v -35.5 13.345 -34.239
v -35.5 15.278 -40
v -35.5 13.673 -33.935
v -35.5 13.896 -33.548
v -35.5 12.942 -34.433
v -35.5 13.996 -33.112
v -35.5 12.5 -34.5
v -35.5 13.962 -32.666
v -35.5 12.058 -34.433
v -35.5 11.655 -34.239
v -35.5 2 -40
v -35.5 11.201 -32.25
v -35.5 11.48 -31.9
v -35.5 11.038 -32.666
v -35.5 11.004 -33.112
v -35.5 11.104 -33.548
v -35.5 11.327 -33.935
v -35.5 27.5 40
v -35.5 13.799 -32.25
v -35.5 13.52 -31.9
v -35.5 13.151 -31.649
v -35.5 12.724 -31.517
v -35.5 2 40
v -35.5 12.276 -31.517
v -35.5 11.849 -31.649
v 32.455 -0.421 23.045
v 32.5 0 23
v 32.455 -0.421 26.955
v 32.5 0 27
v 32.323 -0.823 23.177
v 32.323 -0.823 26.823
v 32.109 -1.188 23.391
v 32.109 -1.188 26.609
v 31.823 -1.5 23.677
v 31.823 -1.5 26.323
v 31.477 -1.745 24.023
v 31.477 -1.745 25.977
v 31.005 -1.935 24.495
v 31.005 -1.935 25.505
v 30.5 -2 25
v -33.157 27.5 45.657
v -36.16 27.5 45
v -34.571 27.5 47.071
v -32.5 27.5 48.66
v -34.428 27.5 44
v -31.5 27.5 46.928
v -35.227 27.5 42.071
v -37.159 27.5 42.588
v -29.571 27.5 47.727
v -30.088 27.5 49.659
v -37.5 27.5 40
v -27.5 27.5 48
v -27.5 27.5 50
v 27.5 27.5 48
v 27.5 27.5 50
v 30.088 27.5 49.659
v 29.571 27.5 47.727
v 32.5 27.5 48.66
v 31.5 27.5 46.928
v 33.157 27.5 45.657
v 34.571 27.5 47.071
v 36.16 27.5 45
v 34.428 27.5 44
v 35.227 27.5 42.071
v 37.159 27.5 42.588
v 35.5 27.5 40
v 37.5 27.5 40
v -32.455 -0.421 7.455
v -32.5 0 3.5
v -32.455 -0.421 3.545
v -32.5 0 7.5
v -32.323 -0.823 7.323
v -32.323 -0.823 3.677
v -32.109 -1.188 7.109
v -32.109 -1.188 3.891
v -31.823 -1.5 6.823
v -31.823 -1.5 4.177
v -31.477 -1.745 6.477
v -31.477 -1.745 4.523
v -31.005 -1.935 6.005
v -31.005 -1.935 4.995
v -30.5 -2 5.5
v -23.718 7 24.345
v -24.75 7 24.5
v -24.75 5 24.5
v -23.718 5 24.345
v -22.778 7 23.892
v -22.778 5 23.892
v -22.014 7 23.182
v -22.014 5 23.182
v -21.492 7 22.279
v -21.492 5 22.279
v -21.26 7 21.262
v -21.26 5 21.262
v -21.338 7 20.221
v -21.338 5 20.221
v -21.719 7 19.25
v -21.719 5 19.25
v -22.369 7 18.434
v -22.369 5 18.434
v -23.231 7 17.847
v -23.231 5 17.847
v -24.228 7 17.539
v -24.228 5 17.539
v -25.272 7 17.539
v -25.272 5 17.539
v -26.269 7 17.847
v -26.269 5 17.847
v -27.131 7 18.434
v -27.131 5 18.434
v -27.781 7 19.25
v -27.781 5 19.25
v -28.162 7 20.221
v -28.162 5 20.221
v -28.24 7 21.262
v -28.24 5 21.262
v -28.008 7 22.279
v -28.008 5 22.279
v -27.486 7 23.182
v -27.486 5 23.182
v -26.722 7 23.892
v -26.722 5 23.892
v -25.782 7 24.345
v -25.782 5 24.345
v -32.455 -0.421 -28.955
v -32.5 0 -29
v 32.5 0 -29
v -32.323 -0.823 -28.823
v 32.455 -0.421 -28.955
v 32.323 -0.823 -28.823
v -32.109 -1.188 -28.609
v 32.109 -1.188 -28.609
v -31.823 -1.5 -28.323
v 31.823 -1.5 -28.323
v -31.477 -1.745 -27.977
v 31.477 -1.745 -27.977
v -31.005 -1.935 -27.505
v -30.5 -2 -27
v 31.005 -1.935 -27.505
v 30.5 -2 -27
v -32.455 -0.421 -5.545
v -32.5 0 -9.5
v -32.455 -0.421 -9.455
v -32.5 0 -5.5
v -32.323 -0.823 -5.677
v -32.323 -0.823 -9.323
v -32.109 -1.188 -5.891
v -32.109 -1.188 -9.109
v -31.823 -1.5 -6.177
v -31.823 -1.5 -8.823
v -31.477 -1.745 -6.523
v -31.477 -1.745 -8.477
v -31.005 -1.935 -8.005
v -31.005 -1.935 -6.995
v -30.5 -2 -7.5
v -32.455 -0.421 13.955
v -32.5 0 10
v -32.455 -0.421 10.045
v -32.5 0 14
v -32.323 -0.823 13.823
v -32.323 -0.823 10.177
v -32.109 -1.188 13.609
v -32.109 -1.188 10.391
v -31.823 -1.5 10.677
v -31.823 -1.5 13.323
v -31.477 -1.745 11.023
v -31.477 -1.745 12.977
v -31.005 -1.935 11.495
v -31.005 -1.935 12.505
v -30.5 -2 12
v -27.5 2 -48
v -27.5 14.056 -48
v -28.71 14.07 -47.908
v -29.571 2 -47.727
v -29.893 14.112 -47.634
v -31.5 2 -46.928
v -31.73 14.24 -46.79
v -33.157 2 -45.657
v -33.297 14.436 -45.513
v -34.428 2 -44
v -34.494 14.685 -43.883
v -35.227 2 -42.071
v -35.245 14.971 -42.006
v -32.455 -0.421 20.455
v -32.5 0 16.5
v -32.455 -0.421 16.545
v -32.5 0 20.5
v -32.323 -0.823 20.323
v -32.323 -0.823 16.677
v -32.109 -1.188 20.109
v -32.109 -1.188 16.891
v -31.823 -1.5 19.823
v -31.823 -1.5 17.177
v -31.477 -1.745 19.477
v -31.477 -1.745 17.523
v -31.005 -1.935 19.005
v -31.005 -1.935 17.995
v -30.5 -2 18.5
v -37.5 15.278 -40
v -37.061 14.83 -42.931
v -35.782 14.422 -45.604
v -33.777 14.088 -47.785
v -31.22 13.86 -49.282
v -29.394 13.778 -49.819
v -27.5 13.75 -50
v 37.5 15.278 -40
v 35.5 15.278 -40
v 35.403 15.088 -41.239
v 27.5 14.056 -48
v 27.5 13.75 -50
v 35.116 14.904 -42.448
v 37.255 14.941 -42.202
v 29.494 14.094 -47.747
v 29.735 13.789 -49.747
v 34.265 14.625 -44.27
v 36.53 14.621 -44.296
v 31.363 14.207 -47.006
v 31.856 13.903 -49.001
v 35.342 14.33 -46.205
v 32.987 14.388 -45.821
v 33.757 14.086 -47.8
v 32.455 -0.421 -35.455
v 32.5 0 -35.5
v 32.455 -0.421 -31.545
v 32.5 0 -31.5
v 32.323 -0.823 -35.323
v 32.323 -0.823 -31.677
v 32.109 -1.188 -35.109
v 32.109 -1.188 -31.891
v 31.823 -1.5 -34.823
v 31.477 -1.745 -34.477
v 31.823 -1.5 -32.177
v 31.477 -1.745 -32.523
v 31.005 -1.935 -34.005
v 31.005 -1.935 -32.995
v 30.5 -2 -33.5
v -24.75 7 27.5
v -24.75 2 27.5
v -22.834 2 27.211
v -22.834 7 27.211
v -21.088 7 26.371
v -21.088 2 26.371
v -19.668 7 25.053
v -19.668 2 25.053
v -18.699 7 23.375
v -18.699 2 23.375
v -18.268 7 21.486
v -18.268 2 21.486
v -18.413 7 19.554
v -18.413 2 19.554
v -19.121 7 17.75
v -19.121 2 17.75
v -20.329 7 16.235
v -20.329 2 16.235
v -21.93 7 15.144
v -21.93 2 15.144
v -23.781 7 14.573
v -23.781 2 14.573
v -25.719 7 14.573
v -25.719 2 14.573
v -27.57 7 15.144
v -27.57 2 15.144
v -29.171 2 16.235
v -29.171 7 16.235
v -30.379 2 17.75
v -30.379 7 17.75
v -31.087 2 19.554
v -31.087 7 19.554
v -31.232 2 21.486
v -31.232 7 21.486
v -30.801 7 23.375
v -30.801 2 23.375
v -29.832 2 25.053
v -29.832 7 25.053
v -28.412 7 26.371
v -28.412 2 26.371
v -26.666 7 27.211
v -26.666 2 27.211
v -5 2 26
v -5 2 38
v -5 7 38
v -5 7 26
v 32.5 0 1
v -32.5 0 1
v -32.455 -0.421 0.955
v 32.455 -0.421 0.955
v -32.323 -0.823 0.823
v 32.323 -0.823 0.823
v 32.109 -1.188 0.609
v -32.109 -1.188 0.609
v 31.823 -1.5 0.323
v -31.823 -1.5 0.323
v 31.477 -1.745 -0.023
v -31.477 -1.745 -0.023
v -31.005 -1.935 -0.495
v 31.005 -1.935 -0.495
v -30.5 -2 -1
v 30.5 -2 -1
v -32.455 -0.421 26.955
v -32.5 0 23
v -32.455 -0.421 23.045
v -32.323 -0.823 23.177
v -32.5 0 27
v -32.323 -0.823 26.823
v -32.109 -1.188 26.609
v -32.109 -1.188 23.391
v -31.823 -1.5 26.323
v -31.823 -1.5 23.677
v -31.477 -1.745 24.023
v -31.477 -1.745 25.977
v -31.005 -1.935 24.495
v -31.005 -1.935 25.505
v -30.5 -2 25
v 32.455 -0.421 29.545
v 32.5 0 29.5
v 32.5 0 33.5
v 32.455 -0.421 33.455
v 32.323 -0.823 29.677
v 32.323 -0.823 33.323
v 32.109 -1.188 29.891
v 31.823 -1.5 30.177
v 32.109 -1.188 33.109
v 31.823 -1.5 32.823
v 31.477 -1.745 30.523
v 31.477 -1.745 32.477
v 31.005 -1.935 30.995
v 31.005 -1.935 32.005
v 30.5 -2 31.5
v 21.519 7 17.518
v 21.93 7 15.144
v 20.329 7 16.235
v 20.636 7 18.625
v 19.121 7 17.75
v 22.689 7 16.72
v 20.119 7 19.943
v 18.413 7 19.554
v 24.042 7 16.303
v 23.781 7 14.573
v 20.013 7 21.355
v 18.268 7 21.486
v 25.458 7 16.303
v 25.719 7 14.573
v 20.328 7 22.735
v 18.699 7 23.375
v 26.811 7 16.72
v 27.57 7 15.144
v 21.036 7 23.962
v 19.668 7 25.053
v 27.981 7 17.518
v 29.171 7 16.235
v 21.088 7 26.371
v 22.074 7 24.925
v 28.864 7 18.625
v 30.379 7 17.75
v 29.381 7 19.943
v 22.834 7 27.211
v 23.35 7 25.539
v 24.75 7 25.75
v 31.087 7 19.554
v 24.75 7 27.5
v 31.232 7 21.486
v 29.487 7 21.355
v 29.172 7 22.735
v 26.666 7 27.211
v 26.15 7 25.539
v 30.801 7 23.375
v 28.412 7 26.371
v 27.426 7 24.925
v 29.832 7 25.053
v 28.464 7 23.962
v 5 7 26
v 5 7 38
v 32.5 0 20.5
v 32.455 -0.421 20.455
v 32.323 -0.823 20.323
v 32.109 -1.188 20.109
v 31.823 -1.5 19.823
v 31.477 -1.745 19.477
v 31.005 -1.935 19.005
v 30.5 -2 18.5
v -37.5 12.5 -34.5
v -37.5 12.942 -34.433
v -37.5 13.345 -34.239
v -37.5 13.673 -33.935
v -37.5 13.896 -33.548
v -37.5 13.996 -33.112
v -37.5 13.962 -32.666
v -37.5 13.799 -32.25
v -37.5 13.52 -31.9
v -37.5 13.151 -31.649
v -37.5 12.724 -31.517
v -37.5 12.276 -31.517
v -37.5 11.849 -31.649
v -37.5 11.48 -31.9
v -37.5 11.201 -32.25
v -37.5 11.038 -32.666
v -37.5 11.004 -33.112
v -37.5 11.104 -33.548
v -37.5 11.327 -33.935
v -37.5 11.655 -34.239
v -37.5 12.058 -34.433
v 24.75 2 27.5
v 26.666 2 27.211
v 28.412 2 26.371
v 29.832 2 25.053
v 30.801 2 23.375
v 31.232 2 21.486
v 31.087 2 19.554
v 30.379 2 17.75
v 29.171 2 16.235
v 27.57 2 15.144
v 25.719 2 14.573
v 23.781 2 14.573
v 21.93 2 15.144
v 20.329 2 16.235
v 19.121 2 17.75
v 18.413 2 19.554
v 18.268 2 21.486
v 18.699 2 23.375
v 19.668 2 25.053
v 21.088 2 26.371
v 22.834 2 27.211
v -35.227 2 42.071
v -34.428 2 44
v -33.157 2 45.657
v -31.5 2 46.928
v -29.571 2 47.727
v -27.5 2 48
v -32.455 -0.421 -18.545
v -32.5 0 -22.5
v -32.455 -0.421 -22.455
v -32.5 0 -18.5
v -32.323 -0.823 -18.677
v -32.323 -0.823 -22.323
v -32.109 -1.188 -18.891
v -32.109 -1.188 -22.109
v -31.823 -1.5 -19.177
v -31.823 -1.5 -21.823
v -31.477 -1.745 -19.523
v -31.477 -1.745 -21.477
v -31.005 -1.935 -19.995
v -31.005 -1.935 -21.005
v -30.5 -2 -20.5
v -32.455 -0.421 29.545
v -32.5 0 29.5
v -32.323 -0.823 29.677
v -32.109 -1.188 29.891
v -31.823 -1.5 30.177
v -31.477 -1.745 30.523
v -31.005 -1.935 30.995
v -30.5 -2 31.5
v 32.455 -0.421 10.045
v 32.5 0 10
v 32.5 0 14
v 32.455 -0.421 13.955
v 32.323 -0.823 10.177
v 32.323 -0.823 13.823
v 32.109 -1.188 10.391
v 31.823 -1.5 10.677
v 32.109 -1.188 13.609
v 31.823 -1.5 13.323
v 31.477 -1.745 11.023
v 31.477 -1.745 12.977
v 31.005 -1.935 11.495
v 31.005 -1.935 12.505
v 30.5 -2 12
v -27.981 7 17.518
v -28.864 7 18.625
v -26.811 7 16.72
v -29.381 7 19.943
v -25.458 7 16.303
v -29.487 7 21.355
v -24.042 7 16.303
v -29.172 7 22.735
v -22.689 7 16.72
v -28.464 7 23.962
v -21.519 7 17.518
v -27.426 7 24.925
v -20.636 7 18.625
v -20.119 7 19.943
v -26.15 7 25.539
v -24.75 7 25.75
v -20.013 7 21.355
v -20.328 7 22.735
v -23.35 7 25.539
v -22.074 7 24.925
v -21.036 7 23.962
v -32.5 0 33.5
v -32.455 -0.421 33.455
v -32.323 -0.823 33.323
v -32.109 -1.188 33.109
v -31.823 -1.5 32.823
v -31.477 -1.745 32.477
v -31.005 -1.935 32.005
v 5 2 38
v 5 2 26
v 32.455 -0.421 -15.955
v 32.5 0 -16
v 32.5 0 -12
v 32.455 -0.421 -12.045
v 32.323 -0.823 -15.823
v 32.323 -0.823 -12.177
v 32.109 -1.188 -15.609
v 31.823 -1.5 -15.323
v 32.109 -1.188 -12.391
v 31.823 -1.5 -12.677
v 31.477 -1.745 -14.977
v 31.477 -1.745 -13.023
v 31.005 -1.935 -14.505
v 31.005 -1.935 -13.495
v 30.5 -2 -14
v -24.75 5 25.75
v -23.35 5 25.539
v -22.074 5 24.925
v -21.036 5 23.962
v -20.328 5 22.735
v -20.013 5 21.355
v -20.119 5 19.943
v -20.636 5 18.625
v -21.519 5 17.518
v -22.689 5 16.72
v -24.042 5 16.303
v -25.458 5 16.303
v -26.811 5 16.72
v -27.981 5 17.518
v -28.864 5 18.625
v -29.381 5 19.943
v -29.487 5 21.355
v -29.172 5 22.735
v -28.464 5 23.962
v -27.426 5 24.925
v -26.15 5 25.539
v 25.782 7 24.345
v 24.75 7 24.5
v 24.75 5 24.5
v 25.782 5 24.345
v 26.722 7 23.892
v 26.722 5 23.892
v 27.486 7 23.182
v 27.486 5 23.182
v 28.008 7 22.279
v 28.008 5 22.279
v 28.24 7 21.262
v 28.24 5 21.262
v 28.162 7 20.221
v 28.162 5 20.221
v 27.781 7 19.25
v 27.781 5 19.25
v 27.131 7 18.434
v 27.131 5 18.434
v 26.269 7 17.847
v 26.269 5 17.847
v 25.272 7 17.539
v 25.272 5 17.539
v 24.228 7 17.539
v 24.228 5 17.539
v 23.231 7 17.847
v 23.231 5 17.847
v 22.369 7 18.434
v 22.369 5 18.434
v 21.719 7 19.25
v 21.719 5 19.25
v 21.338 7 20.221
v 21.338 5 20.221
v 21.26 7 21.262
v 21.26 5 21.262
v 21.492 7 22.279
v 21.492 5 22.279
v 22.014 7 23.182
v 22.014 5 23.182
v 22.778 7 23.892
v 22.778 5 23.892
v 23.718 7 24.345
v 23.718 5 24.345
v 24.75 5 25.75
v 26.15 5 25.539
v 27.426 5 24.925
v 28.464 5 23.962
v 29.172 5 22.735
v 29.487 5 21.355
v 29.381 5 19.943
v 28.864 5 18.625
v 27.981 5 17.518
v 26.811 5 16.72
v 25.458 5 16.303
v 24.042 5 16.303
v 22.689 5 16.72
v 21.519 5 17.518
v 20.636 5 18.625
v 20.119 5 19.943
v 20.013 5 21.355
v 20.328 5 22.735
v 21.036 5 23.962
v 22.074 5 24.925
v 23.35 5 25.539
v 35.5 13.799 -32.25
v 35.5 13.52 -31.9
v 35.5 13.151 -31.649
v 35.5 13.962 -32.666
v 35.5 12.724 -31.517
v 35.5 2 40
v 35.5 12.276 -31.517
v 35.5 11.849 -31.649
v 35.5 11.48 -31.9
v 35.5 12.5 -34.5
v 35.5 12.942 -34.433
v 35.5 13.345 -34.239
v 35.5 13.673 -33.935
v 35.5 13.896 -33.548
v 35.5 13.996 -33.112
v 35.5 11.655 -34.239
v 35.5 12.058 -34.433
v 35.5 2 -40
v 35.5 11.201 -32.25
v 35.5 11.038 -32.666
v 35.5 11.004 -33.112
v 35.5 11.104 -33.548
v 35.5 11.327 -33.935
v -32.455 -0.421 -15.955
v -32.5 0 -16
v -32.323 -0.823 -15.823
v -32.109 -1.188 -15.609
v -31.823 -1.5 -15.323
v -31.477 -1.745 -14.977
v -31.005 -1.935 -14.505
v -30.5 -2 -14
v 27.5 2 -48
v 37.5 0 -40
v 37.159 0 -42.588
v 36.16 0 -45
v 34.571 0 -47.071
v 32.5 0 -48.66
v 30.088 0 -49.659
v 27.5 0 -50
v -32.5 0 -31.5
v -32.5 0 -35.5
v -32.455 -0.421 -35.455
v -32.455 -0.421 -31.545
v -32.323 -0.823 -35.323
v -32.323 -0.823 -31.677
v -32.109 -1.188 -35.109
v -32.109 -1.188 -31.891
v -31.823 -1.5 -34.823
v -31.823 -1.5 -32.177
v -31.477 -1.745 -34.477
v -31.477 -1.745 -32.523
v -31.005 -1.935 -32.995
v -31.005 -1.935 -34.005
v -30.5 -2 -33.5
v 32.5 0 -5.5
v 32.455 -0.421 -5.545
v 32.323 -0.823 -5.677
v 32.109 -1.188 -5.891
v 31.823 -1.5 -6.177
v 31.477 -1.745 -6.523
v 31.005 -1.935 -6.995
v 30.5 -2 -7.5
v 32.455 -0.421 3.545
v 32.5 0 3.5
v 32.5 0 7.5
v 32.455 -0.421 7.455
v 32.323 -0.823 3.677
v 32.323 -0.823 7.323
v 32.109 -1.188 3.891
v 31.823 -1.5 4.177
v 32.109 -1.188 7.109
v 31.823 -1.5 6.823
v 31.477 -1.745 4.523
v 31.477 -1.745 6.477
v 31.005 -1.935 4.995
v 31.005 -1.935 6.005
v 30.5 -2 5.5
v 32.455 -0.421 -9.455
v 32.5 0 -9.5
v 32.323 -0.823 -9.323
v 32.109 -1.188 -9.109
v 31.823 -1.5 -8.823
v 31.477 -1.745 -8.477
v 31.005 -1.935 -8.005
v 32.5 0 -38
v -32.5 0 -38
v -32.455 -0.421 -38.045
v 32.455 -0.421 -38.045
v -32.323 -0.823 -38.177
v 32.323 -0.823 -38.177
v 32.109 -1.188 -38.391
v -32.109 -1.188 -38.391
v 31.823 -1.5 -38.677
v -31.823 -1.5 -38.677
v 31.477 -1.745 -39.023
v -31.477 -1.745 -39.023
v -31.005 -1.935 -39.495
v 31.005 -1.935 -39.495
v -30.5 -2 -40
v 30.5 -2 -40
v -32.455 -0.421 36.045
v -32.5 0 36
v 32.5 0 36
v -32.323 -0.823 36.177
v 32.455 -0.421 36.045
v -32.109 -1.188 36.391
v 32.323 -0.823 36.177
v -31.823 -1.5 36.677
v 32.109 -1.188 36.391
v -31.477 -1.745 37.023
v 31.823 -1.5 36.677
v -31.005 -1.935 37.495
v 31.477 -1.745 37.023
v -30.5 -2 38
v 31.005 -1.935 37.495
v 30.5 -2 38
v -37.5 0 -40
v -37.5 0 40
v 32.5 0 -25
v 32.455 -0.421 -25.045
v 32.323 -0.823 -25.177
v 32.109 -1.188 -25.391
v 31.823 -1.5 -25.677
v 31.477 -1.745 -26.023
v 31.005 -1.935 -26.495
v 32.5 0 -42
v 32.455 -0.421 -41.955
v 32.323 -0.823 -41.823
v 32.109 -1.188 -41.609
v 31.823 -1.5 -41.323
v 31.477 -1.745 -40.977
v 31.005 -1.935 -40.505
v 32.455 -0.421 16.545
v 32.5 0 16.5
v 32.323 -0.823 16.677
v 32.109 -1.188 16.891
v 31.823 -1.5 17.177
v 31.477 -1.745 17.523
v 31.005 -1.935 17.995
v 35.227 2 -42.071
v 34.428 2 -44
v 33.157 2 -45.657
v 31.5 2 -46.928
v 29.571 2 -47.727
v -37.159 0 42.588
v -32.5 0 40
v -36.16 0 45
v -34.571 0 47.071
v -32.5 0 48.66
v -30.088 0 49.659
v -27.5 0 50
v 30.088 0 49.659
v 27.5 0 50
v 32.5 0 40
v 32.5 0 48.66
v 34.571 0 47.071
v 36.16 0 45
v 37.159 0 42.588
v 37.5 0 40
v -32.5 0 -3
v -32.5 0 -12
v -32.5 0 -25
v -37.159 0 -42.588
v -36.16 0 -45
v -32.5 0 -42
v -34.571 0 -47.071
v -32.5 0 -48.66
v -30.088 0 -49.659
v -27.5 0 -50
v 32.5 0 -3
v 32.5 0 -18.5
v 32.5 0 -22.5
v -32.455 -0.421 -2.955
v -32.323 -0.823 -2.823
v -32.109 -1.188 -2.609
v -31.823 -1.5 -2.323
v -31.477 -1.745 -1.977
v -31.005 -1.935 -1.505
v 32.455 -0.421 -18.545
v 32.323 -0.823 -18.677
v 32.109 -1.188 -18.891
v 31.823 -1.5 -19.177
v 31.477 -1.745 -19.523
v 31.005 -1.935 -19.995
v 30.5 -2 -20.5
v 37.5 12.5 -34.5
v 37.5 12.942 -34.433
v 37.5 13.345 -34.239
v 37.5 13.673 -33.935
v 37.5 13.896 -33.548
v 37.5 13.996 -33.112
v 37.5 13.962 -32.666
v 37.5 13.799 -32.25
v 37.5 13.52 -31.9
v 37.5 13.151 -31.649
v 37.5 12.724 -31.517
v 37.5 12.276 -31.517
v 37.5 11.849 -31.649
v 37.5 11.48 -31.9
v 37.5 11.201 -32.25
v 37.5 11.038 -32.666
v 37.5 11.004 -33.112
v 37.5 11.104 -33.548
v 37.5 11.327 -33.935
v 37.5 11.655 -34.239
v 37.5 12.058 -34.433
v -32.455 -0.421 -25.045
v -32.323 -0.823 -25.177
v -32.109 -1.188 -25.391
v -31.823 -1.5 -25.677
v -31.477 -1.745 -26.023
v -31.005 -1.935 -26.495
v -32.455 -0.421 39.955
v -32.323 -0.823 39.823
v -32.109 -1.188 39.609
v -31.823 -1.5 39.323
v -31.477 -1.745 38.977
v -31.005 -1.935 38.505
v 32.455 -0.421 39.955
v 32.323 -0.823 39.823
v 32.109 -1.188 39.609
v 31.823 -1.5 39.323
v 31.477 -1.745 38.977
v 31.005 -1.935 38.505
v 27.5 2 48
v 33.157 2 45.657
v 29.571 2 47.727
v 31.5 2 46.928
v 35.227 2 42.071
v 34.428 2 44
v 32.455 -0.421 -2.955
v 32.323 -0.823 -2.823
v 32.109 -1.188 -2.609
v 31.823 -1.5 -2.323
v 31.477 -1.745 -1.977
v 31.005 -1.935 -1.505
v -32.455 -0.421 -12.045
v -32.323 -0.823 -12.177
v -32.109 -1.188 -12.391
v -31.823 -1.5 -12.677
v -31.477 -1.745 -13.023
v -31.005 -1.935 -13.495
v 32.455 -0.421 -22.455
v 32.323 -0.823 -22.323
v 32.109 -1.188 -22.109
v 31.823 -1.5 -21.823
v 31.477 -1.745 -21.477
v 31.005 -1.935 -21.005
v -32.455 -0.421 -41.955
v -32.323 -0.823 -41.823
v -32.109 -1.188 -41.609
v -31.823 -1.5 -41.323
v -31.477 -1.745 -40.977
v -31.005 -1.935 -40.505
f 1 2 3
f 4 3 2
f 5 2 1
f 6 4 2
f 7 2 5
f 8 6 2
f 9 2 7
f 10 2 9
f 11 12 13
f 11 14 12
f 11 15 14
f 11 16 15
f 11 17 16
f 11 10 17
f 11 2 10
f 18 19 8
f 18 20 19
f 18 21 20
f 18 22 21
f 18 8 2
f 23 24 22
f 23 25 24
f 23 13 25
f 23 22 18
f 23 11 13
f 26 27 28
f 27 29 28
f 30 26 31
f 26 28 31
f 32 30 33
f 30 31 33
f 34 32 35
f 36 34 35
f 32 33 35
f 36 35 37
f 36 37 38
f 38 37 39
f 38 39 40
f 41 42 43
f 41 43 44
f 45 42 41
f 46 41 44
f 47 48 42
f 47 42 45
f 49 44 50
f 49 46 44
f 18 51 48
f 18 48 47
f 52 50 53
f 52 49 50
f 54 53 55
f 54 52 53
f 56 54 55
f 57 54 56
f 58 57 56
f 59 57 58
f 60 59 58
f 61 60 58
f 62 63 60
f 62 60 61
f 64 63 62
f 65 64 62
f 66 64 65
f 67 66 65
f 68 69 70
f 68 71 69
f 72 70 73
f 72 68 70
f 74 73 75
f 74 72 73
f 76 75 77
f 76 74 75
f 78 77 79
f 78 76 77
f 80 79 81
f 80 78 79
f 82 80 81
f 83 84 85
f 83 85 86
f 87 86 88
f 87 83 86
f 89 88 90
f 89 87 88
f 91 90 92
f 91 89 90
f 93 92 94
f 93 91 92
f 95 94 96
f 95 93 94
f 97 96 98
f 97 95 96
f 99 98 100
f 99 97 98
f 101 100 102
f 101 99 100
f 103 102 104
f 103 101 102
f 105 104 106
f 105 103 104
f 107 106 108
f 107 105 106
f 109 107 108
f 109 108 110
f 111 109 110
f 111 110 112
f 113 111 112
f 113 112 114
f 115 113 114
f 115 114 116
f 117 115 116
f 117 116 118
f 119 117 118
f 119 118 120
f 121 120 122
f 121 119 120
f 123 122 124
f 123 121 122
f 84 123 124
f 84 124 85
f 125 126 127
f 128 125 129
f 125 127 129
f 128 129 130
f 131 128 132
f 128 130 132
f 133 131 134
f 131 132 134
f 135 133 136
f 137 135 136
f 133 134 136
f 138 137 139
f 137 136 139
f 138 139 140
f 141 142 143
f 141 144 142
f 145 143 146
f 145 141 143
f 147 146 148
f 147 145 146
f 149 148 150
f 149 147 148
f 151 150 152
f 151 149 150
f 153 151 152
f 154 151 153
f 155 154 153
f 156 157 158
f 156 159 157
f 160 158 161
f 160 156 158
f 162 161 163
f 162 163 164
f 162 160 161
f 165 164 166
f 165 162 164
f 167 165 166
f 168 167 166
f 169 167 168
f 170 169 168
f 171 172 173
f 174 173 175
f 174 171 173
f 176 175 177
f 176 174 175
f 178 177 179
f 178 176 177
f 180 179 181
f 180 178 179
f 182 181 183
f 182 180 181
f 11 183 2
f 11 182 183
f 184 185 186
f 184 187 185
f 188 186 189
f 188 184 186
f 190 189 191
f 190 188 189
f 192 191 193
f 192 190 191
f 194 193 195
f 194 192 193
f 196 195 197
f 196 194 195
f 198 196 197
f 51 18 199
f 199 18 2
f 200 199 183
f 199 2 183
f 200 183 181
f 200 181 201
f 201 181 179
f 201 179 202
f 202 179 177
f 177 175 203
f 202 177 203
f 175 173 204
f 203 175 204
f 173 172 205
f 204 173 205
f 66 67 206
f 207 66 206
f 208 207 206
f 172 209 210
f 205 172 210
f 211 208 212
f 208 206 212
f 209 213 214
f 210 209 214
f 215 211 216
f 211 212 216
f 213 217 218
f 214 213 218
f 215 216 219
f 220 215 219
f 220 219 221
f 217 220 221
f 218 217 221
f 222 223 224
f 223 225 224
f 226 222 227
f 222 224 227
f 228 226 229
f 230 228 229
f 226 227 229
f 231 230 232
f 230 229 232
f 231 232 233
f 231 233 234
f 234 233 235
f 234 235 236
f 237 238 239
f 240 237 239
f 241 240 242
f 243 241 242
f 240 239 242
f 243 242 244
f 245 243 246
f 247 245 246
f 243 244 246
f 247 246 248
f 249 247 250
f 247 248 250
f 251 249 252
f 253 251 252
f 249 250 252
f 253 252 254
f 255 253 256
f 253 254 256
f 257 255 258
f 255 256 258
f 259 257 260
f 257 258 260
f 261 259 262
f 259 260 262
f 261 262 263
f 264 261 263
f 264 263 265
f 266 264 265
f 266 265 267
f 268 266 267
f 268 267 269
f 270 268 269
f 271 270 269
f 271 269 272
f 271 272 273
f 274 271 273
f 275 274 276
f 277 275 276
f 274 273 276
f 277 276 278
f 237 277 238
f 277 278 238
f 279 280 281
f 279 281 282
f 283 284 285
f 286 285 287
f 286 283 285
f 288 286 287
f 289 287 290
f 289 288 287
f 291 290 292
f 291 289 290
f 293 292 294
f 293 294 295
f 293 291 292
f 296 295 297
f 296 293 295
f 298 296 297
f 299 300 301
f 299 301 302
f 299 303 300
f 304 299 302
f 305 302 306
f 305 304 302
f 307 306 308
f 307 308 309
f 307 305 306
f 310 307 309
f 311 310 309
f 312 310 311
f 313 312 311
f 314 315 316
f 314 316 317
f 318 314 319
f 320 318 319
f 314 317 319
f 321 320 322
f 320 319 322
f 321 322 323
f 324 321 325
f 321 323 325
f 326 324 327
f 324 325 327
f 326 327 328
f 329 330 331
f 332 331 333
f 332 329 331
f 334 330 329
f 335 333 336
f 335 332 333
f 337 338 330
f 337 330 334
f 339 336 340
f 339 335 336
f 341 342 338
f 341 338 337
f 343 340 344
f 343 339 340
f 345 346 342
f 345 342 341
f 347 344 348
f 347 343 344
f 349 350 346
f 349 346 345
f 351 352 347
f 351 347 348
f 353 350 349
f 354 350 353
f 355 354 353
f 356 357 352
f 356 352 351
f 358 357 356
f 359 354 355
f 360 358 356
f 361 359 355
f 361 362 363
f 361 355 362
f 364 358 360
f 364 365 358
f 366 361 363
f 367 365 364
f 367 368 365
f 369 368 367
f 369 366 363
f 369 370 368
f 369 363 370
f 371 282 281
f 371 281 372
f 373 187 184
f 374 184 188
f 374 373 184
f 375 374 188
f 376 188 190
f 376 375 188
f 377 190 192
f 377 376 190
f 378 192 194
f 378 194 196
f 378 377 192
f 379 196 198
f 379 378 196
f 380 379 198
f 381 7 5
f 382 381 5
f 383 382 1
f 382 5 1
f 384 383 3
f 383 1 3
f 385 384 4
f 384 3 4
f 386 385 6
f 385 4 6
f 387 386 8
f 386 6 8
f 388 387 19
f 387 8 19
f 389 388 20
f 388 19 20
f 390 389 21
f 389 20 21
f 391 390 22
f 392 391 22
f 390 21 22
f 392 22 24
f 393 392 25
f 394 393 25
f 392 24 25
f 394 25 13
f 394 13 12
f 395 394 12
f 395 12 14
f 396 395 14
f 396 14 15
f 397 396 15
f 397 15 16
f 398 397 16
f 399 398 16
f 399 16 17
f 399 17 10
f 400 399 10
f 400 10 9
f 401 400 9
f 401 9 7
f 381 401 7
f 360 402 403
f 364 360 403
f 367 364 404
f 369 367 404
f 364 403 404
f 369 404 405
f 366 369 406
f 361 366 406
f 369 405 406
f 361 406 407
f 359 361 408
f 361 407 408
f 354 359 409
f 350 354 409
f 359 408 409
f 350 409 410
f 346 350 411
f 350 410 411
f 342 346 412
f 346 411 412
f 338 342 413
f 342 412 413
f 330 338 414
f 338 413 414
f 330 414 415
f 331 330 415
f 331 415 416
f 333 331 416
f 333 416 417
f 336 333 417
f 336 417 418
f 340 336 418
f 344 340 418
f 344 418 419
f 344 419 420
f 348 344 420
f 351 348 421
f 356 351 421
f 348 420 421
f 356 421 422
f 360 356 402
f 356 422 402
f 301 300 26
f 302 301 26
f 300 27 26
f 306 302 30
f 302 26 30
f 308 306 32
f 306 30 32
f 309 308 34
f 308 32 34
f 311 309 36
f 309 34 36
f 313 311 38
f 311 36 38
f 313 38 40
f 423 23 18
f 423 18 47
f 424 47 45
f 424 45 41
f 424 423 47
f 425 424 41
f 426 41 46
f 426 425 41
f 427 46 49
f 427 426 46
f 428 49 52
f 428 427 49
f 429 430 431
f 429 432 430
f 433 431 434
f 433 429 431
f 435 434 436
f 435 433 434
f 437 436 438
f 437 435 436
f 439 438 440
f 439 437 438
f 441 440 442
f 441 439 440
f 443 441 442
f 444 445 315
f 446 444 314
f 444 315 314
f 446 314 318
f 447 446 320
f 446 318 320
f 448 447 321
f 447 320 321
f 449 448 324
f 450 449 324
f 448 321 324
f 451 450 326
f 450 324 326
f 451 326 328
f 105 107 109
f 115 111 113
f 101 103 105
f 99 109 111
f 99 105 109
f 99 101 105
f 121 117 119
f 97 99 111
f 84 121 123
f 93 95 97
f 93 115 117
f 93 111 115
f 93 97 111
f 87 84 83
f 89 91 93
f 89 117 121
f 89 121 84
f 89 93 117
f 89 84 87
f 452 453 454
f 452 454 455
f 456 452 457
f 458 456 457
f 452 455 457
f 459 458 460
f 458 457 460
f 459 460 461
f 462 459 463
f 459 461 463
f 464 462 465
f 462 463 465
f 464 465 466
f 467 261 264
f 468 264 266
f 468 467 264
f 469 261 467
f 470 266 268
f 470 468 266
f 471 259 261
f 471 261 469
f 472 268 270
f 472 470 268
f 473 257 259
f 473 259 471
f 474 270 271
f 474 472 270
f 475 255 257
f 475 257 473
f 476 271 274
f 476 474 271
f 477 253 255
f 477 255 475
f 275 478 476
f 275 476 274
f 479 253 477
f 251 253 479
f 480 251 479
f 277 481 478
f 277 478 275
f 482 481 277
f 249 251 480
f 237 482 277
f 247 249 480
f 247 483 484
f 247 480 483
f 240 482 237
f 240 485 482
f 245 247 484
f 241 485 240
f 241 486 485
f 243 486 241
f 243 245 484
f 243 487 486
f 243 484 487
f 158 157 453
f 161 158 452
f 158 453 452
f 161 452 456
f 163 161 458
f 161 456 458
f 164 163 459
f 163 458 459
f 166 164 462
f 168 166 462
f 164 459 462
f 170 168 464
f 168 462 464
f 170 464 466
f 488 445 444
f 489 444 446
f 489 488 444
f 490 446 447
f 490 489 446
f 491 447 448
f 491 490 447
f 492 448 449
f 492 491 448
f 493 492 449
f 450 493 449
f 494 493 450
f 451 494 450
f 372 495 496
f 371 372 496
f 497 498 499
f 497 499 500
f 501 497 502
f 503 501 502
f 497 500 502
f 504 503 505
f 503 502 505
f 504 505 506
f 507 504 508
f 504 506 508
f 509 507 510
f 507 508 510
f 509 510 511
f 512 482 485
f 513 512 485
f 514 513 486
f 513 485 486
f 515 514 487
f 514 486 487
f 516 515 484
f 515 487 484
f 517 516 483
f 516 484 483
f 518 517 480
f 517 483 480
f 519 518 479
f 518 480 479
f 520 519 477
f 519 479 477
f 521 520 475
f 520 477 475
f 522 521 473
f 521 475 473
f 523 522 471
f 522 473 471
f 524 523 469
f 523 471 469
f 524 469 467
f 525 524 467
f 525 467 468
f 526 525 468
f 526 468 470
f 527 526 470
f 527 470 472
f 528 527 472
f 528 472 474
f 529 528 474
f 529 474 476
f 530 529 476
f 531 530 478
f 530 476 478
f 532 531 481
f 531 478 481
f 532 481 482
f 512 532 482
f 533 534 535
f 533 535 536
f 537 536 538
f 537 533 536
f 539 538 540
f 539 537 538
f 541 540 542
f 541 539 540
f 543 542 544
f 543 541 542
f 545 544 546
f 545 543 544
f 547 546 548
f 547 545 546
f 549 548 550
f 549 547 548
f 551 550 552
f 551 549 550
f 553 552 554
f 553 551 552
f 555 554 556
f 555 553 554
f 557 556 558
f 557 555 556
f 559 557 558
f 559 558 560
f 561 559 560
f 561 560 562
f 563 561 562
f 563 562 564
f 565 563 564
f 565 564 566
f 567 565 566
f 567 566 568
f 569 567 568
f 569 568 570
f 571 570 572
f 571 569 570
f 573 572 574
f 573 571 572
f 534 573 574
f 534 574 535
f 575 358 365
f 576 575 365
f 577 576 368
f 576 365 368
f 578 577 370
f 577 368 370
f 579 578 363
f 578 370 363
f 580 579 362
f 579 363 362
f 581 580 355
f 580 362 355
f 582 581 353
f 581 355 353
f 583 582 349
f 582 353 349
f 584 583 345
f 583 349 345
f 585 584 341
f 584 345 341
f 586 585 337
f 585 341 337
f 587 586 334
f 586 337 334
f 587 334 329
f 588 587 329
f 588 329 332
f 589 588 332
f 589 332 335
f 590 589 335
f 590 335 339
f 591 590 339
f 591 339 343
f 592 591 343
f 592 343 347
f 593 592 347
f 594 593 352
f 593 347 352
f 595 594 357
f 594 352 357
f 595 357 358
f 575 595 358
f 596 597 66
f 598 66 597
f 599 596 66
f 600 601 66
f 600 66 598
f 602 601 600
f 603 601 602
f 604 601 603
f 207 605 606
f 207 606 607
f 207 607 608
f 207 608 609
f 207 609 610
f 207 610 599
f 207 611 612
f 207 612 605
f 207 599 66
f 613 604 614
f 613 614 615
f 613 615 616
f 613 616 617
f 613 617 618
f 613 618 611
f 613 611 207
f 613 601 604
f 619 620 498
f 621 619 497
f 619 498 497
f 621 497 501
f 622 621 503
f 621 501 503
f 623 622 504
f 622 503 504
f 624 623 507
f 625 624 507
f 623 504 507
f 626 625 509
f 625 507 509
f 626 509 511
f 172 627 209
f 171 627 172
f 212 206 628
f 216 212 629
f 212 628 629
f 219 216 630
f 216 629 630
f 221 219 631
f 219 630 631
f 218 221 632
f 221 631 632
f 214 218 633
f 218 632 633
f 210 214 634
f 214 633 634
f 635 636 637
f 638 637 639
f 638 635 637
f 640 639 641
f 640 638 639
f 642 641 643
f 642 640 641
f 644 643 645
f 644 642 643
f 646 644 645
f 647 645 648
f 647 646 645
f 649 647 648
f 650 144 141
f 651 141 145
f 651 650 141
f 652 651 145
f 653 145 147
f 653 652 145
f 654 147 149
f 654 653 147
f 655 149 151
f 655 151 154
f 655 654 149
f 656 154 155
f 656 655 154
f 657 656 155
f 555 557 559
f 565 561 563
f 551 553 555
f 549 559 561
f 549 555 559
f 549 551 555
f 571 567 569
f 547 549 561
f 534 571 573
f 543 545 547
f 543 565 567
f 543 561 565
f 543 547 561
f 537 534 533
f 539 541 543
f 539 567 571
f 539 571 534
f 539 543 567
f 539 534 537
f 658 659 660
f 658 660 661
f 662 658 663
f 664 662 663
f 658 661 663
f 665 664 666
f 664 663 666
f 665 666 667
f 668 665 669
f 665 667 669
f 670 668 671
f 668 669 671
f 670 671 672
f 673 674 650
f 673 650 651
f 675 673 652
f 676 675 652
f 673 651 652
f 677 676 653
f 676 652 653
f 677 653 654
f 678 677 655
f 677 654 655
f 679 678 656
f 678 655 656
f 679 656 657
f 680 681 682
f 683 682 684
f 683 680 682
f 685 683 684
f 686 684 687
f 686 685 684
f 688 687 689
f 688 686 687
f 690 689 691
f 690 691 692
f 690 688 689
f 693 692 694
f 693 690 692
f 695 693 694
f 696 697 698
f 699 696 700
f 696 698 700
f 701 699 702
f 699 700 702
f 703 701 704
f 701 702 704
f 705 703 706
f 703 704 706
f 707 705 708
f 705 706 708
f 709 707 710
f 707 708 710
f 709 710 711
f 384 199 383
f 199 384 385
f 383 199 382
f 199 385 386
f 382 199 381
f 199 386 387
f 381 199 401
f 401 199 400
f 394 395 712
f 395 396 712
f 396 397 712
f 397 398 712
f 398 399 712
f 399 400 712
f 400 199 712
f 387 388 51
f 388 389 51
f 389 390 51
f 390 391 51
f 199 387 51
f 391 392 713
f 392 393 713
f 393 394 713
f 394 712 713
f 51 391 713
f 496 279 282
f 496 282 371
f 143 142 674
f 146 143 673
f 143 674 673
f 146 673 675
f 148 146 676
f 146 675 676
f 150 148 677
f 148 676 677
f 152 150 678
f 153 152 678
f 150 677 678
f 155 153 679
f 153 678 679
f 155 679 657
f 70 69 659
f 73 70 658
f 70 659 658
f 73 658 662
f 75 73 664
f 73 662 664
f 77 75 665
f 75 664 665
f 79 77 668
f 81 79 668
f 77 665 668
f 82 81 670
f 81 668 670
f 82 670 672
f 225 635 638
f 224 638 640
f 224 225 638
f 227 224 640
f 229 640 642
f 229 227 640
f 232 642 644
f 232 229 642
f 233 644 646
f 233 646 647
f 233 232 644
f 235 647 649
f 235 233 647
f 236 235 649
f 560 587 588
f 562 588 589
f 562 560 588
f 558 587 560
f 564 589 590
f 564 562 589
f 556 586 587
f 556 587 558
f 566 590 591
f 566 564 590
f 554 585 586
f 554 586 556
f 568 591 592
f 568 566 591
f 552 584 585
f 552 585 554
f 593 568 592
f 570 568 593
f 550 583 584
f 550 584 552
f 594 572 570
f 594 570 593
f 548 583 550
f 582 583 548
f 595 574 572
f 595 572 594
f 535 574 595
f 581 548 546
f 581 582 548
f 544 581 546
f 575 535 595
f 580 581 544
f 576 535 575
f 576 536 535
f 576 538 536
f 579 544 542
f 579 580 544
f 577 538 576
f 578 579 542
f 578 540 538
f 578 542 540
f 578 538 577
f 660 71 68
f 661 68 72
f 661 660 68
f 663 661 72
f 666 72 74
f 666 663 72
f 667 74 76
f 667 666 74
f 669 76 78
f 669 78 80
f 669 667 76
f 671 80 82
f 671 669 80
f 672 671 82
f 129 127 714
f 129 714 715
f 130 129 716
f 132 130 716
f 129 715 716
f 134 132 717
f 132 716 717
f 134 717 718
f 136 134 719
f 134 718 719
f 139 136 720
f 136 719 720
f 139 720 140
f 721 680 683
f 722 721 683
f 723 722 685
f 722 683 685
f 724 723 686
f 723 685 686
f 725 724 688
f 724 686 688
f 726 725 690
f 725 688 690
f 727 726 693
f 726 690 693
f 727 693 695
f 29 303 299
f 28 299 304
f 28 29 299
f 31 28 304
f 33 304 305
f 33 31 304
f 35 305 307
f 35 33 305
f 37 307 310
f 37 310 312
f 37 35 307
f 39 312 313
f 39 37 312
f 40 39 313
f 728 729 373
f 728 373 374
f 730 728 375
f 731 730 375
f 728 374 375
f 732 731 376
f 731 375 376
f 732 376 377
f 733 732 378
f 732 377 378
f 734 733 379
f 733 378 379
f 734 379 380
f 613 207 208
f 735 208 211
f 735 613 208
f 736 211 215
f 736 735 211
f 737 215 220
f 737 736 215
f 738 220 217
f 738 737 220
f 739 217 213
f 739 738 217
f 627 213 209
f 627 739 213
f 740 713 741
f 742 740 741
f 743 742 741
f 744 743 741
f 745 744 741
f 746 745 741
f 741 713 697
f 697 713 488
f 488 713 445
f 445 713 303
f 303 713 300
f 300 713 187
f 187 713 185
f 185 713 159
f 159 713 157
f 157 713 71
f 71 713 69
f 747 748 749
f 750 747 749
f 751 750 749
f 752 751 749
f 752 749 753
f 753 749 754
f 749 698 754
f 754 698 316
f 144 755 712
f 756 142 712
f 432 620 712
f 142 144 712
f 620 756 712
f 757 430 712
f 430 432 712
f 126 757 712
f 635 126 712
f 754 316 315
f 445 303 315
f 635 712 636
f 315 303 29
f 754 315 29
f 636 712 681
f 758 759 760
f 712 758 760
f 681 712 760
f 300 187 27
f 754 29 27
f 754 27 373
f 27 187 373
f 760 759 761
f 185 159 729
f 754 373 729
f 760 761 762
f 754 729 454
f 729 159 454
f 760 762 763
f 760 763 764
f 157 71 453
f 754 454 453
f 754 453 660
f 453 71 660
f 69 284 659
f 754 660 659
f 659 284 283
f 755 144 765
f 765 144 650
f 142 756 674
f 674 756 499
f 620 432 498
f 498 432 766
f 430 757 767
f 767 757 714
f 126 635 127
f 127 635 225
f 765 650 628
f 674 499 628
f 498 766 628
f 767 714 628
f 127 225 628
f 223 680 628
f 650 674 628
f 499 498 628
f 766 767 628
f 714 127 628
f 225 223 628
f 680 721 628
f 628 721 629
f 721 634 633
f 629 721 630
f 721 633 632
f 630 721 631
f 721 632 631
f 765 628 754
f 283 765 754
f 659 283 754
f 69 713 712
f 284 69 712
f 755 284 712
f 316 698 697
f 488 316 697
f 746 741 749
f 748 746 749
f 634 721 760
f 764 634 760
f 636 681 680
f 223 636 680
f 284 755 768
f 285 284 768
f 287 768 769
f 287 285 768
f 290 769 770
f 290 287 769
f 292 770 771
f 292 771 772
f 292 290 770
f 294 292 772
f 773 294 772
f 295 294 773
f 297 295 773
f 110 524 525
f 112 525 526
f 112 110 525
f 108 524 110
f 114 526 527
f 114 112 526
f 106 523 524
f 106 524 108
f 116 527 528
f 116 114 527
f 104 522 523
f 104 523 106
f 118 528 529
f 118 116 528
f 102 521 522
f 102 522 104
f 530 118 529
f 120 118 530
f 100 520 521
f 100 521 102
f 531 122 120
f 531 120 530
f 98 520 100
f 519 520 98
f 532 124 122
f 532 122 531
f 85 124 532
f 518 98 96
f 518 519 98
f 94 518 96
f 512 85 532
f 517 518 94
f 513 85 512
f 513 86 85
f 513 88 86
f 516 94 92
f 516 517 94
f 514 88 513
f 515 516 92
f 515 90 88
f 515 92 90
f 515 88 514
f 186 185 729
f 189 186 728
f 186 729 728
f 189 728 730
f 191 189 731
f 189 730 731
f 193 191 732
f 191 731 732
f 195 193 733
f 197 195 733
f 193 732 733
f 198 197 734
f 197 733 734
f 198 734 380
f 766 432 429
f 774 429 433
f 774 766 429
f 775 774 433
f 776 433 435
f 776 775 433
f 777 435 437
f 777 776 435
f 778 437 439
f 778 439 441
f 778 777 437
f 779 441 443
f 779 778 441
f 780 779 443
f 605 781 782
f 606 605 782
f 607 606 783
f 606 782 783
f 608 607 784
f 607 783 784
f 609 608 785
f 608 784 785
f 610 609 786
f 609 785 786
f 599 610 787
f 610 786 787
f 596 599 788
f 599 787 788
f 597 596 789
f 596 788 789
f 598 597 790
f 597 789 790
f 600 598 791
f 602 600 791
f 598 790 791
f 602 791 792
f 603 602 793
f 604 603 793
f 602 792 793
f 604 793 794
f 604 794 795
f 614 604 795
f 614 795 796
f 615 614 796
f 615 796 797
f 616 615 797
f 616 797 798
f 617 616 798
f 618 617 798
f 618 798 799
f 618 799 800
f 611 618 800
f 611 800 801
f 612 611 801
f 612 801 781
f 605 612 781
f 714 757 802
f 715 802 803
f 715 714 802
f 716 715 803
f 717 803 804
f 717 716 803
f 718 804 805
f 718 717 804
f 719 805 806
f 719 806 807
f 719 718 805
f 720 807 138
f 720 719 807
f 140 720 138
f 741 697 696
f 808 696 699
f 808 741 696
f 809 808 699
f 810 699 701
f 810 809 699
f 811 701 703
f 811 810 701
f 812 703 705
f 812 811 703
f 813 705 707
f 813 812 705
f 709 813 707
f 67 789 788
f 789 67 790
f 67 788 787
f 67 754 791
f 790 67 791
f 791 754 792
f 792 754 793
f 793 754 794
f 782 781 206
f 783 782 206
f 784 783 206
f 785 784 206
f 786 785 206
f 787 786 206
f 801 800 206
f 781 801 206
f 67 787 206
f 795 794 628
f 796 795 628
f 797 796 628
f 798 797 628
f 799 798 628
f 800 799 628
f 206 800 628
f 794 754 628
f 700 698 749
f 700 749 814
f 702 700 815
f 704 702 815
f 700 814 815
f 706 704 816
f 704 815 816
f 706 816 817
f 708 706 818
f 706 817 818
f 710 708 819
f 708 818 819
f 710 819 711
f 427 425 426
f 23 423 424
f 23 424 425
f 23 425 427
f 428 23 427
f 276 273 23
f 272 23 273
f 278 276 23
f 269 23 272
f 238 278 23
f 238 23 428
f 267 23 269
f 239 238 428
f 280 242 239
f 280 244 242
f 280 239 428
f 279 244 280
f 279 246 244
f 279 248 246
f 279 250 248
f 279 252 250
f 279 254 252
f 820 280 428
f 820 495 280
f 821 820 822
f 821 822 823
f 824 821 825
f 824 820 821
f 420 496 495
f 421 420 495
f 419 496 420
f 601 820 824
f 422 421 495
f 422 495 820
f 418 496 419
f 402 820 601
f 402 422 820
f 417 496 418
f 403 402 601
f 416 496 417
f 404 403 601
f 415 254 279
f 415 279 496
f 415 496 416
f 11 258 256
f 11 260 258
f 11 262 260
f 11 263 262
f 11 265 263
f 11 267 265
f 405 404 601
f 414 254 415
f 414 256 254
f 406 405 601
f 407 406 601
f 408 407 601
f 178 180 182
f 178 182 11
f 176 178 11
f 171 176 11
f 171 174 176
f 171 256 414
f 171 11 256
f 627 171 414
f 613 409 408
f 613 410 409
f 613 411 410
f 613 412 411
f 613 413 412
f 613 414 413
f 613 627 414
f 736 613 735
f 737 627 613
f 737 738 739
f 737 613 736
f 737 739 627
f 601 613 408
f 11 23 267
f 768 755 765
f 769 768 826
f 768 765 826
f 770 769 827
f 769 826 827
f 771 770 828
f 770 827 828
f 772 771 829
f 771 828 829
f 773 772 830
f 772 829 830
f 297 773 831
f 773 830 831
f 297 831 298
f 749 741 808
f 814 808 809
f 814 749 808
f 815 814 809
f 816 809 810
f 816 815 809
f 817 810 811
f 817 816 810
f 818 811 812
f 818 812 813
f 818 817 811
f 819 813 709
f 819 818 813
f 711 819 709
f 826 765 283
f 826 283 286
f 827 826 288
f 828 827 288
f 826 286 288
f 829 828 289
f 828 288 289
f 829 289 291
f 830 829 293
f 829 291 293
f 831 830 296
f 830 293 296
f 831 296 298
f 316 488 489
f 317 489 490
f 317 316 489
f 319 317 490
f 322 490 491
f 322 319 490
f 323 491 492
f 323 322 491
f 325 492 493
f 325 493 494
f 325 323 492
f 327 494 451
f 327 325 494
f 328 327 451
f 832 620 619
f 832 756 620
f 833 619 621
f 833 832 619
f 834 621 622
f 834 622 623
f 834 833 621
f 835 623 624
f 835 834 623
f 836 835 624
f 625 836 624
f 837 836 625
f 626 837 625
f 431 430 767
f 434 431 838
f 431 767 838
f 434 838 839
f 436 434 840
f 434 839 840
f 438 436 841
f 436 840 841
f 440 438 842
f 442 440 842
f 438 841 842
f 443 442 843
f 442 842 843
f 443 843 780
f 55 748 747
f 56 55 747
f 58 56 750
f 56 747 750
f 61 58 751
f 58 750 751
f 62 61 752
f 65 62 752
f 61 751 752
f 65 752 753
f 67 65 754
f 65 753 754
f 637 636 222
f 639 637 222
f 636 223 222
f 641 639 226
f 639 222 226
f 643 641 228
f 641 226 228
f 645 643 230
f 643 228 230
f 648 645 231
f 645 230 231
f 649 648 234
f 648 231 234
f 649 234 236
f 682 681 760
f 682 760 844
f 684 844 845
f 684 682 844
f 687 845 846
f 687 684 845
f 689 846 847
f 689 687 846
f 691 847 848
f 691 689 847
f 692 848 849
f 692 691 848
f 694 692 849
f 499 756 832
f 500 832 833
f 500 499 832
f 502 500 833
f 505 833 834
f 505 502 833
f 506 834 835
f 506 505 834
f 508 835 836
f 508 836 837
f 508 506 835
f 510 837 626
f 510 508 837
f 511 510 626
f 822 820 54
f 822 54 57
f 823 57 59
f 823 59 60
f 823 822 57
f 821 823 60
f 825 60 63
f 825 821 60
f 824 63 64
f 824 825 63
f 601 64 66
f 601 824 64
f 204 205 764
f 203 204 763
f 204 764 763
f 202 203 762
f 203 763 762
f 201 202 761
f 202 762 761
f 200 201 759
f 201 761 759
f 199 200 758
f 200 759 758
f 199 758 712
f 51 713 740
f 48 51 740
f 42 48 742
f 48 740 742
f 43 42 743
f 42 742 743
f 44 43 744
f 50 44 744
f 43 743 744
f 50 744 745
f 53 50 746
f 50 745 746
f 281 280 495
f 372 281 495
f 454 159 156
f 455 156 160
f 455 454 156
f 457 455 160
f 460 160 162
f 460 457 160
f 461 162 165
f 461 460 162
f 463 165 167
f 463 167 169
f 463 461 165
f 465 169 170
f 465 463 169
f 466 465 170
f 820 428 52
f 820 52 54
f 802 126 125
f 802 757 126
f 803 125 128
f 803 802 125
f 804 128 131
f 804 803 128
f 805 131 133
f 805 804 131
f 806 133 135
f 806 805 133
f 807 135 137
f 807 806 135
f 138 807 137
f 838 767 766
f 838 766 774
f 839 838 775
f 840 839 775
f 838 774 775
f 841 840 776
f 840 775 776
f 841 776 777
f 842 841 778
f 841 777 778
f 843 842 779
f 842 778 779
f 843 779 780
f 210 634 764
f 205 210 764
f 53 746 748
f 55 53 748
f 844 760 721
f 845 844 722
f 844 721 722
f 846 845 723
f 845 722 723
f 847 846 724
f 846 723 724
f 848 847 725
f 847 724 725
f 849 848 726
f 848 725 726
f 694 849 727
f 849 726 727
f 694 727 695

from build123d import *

# Parameters (mm, degrees)
BOSS_EXTRUDE1_DEPTH = 27.5
SKETCH2_W           = 65
SKETCH2_H           = 4
BOSS_EXTRUDE2_DEPTH = 2
FILLET1_R           = 2
SHELL1_START        = 2
SHELL1_DEPTH        = 25.5
CUT_EXTRUDE1_REACH  = 96.24
SKETCH5_W           = 10
SKETCH5_H           = 12
BOSS_EXTRUDE3_DEPTH = 5
SKETCH7_R           = 6.5
BOSS_EXTRUDE4_DEPTH = 5
SKETCH8_R           = 4.75
SKETCH8_R_2         = 3.5
CUT_EXTRUDE2_DEPTH  = 2
SKETCH9_R           = 1.5
CUT_EXTRUDE3_DEPTH  = 95.240384125


# Read off the part's stored shape, not the designer's step: Shell1
with BuildPart() as part:
    # Sketch1 → Boss-Extrude1 (new body)
    with BuildSketch(Plane(origin=(0, 0, 0), x_dir=(1, 0, 0), z_dir=(0, 1, 0))):
        with BuildLine():
            Line((-27.5, -50), (27.5, -50))
            ThreePointArc((27.5, -50), (34.571067812, -47.071067812), (37.5, -40))
            Line((37.5, -40), (37.5, 40))
            ThreePointArc((37.5, 40), (34.571067812, 47.071067812), (27.5, 50))
            Line((27.5, 50), (-27.5, 50))
            ThreePointArc((-27.5, 50), (-34.571067812, 47.071067812), (-37.5, 40))
            Line((-37.5, 40), (-37.5, -40))
            ThreePointArc((-37.5, -40), (-34.571067812, -47.071067812), (-27.5, -50))
        make_face()
    extrude(amount=BOSS_EXTRUDE1_DEPTH)

    # Sketch2 → Boss-Extrude2 (add)
    with BuildSketch(Plane.XZ):
        with Locations((0, -40)):
            Rectangle(SKETCH2_W, SKETCH2_H)
        with Locations((0, -33.5)):
            Rectangle(SKETCH2_W, SKETCH2_H)
        with Locations((0, -27)):
            Rectangle(SKETCH2_W, SKETCH2_H)
        with Locations((0, -20.5)):
            Rectangle(SKETCH2_W, SKETCH2_H)
        with Locations((0, -14)):
            Rectangle(SKETCH2_W, SKETCH2_H)
        with Locations((0, -7.5)):
            Rectangle(SKETCH2_W, SKETCH2_H)
        with Locations((0, -1)):
            Rectangle(SKETCH2_W, SKETCH2_H)
        with Locations((0, 5.5)):
            Rectangle(SKETCH2_W, SKETCH2_H)
        with Locations((0, 12)):
            Rectangle(SKETCH2_W, SKETCH2_H)
        with Locations((0, 18.5)):
            Rectangle(SKETCH2_W, SKETCH2_H)
        with Locations((0, 25)):
            Rectangle(SKETCH2_W, SKETCH2_H)
        with Locations((0, 31.5)):
            Rectangle(SKETCH2_W, SKETCH2_H)
        with Locations((0, 38)):
            Rectangle(SKETCH2_W, SKETCH2_H)
    extrude(amount=BOSS_EXTRUDE2_DEPTH)

    # Fillet1
    fillet1_edges = [part.edges().sort_by_distance(p)[0] for p in [
        (-32.5, -2, 38),
        (0, -2, 40),
        (32.5, -2, 38),
        (0, -2, 36),
        (-32.5, -2, 31.5),
        (0, -2, 33.5),
        (32.5, -2, 31.5),
        (0, -2, 29.5),
        (-32.5, -2, 12),
        (0, -2, 14),
        (32.5, -2, 12),
        (0, -2, 10),
        (-32.5, -2, 18.5),
        (0, -2, 20.5),
        (32.5, -2, 18.5),
        (0, -2, 16.5),
        (-32.5, -2, -40),
        (0, -2, -38),
        (32.5, -2, -40),
        (0, -2, -42),
        (0, -2, -35.5),
        (-32.5, -2, -33.5),
        (0, -2, -31.5),
        (32.5, -2, -33.5),
        (-32.5, -2, -27),
        (0, -2, -25),
        (32.5, -2, -27),
        (0, -2, -29),
        (-32.5, -2, -20.5),
        (0, -2, -18.5),
        (32.5, -2, -20.5),
        (0, -2, -22.5),
        (-32.5, -2, -14),
        (0, -2, -12),
        (32.5, -2, -14),
        (0, -2, -16),
        (-32.5, -2, -7.5),
        (0, -2, -5.5),
        (32.5, -2, -7.5),
        (0, -2, -9.5),
        (-32.5, -2, -1),
        (0, -2, 1),
        (32.5, -2, -1),
        (0, -2, -3),
        (-32.5, -2, 5.5),
        (0, -2, 7.5),
        (32.5, -2, 5.5),
        (0, -2, 3.5),
        (0, -2, 23),
        (-32.5, -2, 25),
        (0, -2, 27),
        (32.5, -2, 25),
    ]]
    fillet(fillet1_edges, radius=FILLET1_R - 0.0001)  # a hair under: the kernel refuses the full size

    # Shell1 outline → Shell1 (cut)
    with BuildSketch(Plane(origin=(0, 0, 0), x_dir=(1, 0, 0), z_dir=(0, 1, 0)).offset(SHELL1_START)):
        with BuildLine():
            ThreePointArc((-35.5, -40), (-33.156854249, -45.656854249), (-27.5, -48))
            Line((-27.5, -48), (27.5, -48))
            ThreePointArc((27.5, -48), (33.156854249, -45.656854249), (35.5, -40))
            Line((35.5, -40), (35.5, 40))
            ThreePointArc((35.5, 40), (33.156854249, 45.656854249), (27.5, 48))
            Line((27.5, 48), (-27.5, 48))
            ThreePointArc((-27.5, 48), (-33.156854249, 45.656854249), (-35.5, 40))
            Line((-35.5, 40), (-35.5, -40))
        make_face()
    extrude(amount=SHELL1_DEPTH, mode=Mode.SUBTRACT)

    # Cut-Extrude1: up to this face of the body (flat: up to its plane)
    cut_extrude1_end = Plane(part.part.faces().sort_by_distance((-37.5, 13.75, 0))[0])
    # Sketch4 → Cut-Extrude1 (cut, up to the picked face)
    with BuildSketch(Plane(origin=(37.5, 0, 0), x_dir=(0, 0, -1), z_dir=(1, 0, 0)), mode=Mode.PRIVATE) as cut_extrude1_sk1:
        Polygon((40, 27.5), (-40, 27.5), (50, 13.75), (50, 27.5), align=None)
    cut_extrude1_tool1 = split(extrude(cut_extrude1_sk1.sketch, amount=-CUT_EXTRUDE1_REACH, mode=Mode.PRIVATE), bisect_by=cut_extrude1_end, keep=Keep.BOTH, mode=Mode.PRIVATE)
    add(cut_extrude1_tool1.solids().sort_by(Axis((37.5, 22.916667, -20), (-1, 0, 0)))[0], mode=Mode.SUBTRACT)

    # Sketch5 → Boss-Extrude3 (add)
    with BuildSketch(Plane(origin=(0, 2, 0), x_dir=(1, 0, 0), z_dir=(0, 1, 0))):
        with Locations((0, -32)):
            Rectangle(SKETCH5_W, SKETCH5_H)
    extrude(amount=BOSS_EXTRUDE3_DEPTH)

    # Sketch7 → Boss-Extrude4 (add)
    with BuildSketch(Plane(origin=(0, 2, 0), x_dir=(1, 0, 0), z_dir=(0, 1, 0))):
        with Locations(Location((-24.75, -21, 0), (0, 0, 270))):
            Circle(SKETCH7_R)
        with Locations(Location((24.75, -21, 0), (0, 0, 270))):
            Circle(SKETCH7_R)
    extrude(amount=BOSS_EXTRUDE4_DEPTH)

    # Sketch8 → Cut-Extrude2 (cut)
    # profile 1 of 2: a face of its own
    with BuildSketch(Plane(origin=(0, 7, 0), x_dir=(1, 0, 0), z_dir=(0, 1, 0))):
        with Locations(Location((-24.75, -21, 0), (0, 0, 270))):
            Circle(SKETCH8_R)
        with Locations(Location((-24.75, -21, 0), (0, 0, 270))):
            Circle(SKETCH8_R_2, mode=Mode.SUBTRACT)
    # profile 2 of 2: a face of its own
    with BuildSketch(Plane(origin=(0, 7, 0), x_dir=(1, 0, 0), z_dir=(0, 1, 0))):
        with Locations(Location((24.75, -21, 0), (0, 0, 270))):
            Circle(SKETCH8_R)
        with Locations(Location((24.75, -21, 0), (0, 0, 270))):
            Circle(SKETCH8_R_2, mode=Mode.SUBTRACT)
    extrude(amount=-CUT_EXTRUDE2_DEPTH, mode=Mode.SUBTRACT)

    # Sketch9 → Cut-Extrude3 (cut, through all)
    with BuildSketch(Plane(origin=(37.5, 0, 0), x_dir=(0, 0, -1), z_dir=(1, 0, 0))):
        with Locations((33, 12.5)):
            Circle(SKETCH9_R)
    extrude(amount=-CUT_EXTRUDE3_DEPTH, mode=Mode.SUBTRACT)


solid = part.part
